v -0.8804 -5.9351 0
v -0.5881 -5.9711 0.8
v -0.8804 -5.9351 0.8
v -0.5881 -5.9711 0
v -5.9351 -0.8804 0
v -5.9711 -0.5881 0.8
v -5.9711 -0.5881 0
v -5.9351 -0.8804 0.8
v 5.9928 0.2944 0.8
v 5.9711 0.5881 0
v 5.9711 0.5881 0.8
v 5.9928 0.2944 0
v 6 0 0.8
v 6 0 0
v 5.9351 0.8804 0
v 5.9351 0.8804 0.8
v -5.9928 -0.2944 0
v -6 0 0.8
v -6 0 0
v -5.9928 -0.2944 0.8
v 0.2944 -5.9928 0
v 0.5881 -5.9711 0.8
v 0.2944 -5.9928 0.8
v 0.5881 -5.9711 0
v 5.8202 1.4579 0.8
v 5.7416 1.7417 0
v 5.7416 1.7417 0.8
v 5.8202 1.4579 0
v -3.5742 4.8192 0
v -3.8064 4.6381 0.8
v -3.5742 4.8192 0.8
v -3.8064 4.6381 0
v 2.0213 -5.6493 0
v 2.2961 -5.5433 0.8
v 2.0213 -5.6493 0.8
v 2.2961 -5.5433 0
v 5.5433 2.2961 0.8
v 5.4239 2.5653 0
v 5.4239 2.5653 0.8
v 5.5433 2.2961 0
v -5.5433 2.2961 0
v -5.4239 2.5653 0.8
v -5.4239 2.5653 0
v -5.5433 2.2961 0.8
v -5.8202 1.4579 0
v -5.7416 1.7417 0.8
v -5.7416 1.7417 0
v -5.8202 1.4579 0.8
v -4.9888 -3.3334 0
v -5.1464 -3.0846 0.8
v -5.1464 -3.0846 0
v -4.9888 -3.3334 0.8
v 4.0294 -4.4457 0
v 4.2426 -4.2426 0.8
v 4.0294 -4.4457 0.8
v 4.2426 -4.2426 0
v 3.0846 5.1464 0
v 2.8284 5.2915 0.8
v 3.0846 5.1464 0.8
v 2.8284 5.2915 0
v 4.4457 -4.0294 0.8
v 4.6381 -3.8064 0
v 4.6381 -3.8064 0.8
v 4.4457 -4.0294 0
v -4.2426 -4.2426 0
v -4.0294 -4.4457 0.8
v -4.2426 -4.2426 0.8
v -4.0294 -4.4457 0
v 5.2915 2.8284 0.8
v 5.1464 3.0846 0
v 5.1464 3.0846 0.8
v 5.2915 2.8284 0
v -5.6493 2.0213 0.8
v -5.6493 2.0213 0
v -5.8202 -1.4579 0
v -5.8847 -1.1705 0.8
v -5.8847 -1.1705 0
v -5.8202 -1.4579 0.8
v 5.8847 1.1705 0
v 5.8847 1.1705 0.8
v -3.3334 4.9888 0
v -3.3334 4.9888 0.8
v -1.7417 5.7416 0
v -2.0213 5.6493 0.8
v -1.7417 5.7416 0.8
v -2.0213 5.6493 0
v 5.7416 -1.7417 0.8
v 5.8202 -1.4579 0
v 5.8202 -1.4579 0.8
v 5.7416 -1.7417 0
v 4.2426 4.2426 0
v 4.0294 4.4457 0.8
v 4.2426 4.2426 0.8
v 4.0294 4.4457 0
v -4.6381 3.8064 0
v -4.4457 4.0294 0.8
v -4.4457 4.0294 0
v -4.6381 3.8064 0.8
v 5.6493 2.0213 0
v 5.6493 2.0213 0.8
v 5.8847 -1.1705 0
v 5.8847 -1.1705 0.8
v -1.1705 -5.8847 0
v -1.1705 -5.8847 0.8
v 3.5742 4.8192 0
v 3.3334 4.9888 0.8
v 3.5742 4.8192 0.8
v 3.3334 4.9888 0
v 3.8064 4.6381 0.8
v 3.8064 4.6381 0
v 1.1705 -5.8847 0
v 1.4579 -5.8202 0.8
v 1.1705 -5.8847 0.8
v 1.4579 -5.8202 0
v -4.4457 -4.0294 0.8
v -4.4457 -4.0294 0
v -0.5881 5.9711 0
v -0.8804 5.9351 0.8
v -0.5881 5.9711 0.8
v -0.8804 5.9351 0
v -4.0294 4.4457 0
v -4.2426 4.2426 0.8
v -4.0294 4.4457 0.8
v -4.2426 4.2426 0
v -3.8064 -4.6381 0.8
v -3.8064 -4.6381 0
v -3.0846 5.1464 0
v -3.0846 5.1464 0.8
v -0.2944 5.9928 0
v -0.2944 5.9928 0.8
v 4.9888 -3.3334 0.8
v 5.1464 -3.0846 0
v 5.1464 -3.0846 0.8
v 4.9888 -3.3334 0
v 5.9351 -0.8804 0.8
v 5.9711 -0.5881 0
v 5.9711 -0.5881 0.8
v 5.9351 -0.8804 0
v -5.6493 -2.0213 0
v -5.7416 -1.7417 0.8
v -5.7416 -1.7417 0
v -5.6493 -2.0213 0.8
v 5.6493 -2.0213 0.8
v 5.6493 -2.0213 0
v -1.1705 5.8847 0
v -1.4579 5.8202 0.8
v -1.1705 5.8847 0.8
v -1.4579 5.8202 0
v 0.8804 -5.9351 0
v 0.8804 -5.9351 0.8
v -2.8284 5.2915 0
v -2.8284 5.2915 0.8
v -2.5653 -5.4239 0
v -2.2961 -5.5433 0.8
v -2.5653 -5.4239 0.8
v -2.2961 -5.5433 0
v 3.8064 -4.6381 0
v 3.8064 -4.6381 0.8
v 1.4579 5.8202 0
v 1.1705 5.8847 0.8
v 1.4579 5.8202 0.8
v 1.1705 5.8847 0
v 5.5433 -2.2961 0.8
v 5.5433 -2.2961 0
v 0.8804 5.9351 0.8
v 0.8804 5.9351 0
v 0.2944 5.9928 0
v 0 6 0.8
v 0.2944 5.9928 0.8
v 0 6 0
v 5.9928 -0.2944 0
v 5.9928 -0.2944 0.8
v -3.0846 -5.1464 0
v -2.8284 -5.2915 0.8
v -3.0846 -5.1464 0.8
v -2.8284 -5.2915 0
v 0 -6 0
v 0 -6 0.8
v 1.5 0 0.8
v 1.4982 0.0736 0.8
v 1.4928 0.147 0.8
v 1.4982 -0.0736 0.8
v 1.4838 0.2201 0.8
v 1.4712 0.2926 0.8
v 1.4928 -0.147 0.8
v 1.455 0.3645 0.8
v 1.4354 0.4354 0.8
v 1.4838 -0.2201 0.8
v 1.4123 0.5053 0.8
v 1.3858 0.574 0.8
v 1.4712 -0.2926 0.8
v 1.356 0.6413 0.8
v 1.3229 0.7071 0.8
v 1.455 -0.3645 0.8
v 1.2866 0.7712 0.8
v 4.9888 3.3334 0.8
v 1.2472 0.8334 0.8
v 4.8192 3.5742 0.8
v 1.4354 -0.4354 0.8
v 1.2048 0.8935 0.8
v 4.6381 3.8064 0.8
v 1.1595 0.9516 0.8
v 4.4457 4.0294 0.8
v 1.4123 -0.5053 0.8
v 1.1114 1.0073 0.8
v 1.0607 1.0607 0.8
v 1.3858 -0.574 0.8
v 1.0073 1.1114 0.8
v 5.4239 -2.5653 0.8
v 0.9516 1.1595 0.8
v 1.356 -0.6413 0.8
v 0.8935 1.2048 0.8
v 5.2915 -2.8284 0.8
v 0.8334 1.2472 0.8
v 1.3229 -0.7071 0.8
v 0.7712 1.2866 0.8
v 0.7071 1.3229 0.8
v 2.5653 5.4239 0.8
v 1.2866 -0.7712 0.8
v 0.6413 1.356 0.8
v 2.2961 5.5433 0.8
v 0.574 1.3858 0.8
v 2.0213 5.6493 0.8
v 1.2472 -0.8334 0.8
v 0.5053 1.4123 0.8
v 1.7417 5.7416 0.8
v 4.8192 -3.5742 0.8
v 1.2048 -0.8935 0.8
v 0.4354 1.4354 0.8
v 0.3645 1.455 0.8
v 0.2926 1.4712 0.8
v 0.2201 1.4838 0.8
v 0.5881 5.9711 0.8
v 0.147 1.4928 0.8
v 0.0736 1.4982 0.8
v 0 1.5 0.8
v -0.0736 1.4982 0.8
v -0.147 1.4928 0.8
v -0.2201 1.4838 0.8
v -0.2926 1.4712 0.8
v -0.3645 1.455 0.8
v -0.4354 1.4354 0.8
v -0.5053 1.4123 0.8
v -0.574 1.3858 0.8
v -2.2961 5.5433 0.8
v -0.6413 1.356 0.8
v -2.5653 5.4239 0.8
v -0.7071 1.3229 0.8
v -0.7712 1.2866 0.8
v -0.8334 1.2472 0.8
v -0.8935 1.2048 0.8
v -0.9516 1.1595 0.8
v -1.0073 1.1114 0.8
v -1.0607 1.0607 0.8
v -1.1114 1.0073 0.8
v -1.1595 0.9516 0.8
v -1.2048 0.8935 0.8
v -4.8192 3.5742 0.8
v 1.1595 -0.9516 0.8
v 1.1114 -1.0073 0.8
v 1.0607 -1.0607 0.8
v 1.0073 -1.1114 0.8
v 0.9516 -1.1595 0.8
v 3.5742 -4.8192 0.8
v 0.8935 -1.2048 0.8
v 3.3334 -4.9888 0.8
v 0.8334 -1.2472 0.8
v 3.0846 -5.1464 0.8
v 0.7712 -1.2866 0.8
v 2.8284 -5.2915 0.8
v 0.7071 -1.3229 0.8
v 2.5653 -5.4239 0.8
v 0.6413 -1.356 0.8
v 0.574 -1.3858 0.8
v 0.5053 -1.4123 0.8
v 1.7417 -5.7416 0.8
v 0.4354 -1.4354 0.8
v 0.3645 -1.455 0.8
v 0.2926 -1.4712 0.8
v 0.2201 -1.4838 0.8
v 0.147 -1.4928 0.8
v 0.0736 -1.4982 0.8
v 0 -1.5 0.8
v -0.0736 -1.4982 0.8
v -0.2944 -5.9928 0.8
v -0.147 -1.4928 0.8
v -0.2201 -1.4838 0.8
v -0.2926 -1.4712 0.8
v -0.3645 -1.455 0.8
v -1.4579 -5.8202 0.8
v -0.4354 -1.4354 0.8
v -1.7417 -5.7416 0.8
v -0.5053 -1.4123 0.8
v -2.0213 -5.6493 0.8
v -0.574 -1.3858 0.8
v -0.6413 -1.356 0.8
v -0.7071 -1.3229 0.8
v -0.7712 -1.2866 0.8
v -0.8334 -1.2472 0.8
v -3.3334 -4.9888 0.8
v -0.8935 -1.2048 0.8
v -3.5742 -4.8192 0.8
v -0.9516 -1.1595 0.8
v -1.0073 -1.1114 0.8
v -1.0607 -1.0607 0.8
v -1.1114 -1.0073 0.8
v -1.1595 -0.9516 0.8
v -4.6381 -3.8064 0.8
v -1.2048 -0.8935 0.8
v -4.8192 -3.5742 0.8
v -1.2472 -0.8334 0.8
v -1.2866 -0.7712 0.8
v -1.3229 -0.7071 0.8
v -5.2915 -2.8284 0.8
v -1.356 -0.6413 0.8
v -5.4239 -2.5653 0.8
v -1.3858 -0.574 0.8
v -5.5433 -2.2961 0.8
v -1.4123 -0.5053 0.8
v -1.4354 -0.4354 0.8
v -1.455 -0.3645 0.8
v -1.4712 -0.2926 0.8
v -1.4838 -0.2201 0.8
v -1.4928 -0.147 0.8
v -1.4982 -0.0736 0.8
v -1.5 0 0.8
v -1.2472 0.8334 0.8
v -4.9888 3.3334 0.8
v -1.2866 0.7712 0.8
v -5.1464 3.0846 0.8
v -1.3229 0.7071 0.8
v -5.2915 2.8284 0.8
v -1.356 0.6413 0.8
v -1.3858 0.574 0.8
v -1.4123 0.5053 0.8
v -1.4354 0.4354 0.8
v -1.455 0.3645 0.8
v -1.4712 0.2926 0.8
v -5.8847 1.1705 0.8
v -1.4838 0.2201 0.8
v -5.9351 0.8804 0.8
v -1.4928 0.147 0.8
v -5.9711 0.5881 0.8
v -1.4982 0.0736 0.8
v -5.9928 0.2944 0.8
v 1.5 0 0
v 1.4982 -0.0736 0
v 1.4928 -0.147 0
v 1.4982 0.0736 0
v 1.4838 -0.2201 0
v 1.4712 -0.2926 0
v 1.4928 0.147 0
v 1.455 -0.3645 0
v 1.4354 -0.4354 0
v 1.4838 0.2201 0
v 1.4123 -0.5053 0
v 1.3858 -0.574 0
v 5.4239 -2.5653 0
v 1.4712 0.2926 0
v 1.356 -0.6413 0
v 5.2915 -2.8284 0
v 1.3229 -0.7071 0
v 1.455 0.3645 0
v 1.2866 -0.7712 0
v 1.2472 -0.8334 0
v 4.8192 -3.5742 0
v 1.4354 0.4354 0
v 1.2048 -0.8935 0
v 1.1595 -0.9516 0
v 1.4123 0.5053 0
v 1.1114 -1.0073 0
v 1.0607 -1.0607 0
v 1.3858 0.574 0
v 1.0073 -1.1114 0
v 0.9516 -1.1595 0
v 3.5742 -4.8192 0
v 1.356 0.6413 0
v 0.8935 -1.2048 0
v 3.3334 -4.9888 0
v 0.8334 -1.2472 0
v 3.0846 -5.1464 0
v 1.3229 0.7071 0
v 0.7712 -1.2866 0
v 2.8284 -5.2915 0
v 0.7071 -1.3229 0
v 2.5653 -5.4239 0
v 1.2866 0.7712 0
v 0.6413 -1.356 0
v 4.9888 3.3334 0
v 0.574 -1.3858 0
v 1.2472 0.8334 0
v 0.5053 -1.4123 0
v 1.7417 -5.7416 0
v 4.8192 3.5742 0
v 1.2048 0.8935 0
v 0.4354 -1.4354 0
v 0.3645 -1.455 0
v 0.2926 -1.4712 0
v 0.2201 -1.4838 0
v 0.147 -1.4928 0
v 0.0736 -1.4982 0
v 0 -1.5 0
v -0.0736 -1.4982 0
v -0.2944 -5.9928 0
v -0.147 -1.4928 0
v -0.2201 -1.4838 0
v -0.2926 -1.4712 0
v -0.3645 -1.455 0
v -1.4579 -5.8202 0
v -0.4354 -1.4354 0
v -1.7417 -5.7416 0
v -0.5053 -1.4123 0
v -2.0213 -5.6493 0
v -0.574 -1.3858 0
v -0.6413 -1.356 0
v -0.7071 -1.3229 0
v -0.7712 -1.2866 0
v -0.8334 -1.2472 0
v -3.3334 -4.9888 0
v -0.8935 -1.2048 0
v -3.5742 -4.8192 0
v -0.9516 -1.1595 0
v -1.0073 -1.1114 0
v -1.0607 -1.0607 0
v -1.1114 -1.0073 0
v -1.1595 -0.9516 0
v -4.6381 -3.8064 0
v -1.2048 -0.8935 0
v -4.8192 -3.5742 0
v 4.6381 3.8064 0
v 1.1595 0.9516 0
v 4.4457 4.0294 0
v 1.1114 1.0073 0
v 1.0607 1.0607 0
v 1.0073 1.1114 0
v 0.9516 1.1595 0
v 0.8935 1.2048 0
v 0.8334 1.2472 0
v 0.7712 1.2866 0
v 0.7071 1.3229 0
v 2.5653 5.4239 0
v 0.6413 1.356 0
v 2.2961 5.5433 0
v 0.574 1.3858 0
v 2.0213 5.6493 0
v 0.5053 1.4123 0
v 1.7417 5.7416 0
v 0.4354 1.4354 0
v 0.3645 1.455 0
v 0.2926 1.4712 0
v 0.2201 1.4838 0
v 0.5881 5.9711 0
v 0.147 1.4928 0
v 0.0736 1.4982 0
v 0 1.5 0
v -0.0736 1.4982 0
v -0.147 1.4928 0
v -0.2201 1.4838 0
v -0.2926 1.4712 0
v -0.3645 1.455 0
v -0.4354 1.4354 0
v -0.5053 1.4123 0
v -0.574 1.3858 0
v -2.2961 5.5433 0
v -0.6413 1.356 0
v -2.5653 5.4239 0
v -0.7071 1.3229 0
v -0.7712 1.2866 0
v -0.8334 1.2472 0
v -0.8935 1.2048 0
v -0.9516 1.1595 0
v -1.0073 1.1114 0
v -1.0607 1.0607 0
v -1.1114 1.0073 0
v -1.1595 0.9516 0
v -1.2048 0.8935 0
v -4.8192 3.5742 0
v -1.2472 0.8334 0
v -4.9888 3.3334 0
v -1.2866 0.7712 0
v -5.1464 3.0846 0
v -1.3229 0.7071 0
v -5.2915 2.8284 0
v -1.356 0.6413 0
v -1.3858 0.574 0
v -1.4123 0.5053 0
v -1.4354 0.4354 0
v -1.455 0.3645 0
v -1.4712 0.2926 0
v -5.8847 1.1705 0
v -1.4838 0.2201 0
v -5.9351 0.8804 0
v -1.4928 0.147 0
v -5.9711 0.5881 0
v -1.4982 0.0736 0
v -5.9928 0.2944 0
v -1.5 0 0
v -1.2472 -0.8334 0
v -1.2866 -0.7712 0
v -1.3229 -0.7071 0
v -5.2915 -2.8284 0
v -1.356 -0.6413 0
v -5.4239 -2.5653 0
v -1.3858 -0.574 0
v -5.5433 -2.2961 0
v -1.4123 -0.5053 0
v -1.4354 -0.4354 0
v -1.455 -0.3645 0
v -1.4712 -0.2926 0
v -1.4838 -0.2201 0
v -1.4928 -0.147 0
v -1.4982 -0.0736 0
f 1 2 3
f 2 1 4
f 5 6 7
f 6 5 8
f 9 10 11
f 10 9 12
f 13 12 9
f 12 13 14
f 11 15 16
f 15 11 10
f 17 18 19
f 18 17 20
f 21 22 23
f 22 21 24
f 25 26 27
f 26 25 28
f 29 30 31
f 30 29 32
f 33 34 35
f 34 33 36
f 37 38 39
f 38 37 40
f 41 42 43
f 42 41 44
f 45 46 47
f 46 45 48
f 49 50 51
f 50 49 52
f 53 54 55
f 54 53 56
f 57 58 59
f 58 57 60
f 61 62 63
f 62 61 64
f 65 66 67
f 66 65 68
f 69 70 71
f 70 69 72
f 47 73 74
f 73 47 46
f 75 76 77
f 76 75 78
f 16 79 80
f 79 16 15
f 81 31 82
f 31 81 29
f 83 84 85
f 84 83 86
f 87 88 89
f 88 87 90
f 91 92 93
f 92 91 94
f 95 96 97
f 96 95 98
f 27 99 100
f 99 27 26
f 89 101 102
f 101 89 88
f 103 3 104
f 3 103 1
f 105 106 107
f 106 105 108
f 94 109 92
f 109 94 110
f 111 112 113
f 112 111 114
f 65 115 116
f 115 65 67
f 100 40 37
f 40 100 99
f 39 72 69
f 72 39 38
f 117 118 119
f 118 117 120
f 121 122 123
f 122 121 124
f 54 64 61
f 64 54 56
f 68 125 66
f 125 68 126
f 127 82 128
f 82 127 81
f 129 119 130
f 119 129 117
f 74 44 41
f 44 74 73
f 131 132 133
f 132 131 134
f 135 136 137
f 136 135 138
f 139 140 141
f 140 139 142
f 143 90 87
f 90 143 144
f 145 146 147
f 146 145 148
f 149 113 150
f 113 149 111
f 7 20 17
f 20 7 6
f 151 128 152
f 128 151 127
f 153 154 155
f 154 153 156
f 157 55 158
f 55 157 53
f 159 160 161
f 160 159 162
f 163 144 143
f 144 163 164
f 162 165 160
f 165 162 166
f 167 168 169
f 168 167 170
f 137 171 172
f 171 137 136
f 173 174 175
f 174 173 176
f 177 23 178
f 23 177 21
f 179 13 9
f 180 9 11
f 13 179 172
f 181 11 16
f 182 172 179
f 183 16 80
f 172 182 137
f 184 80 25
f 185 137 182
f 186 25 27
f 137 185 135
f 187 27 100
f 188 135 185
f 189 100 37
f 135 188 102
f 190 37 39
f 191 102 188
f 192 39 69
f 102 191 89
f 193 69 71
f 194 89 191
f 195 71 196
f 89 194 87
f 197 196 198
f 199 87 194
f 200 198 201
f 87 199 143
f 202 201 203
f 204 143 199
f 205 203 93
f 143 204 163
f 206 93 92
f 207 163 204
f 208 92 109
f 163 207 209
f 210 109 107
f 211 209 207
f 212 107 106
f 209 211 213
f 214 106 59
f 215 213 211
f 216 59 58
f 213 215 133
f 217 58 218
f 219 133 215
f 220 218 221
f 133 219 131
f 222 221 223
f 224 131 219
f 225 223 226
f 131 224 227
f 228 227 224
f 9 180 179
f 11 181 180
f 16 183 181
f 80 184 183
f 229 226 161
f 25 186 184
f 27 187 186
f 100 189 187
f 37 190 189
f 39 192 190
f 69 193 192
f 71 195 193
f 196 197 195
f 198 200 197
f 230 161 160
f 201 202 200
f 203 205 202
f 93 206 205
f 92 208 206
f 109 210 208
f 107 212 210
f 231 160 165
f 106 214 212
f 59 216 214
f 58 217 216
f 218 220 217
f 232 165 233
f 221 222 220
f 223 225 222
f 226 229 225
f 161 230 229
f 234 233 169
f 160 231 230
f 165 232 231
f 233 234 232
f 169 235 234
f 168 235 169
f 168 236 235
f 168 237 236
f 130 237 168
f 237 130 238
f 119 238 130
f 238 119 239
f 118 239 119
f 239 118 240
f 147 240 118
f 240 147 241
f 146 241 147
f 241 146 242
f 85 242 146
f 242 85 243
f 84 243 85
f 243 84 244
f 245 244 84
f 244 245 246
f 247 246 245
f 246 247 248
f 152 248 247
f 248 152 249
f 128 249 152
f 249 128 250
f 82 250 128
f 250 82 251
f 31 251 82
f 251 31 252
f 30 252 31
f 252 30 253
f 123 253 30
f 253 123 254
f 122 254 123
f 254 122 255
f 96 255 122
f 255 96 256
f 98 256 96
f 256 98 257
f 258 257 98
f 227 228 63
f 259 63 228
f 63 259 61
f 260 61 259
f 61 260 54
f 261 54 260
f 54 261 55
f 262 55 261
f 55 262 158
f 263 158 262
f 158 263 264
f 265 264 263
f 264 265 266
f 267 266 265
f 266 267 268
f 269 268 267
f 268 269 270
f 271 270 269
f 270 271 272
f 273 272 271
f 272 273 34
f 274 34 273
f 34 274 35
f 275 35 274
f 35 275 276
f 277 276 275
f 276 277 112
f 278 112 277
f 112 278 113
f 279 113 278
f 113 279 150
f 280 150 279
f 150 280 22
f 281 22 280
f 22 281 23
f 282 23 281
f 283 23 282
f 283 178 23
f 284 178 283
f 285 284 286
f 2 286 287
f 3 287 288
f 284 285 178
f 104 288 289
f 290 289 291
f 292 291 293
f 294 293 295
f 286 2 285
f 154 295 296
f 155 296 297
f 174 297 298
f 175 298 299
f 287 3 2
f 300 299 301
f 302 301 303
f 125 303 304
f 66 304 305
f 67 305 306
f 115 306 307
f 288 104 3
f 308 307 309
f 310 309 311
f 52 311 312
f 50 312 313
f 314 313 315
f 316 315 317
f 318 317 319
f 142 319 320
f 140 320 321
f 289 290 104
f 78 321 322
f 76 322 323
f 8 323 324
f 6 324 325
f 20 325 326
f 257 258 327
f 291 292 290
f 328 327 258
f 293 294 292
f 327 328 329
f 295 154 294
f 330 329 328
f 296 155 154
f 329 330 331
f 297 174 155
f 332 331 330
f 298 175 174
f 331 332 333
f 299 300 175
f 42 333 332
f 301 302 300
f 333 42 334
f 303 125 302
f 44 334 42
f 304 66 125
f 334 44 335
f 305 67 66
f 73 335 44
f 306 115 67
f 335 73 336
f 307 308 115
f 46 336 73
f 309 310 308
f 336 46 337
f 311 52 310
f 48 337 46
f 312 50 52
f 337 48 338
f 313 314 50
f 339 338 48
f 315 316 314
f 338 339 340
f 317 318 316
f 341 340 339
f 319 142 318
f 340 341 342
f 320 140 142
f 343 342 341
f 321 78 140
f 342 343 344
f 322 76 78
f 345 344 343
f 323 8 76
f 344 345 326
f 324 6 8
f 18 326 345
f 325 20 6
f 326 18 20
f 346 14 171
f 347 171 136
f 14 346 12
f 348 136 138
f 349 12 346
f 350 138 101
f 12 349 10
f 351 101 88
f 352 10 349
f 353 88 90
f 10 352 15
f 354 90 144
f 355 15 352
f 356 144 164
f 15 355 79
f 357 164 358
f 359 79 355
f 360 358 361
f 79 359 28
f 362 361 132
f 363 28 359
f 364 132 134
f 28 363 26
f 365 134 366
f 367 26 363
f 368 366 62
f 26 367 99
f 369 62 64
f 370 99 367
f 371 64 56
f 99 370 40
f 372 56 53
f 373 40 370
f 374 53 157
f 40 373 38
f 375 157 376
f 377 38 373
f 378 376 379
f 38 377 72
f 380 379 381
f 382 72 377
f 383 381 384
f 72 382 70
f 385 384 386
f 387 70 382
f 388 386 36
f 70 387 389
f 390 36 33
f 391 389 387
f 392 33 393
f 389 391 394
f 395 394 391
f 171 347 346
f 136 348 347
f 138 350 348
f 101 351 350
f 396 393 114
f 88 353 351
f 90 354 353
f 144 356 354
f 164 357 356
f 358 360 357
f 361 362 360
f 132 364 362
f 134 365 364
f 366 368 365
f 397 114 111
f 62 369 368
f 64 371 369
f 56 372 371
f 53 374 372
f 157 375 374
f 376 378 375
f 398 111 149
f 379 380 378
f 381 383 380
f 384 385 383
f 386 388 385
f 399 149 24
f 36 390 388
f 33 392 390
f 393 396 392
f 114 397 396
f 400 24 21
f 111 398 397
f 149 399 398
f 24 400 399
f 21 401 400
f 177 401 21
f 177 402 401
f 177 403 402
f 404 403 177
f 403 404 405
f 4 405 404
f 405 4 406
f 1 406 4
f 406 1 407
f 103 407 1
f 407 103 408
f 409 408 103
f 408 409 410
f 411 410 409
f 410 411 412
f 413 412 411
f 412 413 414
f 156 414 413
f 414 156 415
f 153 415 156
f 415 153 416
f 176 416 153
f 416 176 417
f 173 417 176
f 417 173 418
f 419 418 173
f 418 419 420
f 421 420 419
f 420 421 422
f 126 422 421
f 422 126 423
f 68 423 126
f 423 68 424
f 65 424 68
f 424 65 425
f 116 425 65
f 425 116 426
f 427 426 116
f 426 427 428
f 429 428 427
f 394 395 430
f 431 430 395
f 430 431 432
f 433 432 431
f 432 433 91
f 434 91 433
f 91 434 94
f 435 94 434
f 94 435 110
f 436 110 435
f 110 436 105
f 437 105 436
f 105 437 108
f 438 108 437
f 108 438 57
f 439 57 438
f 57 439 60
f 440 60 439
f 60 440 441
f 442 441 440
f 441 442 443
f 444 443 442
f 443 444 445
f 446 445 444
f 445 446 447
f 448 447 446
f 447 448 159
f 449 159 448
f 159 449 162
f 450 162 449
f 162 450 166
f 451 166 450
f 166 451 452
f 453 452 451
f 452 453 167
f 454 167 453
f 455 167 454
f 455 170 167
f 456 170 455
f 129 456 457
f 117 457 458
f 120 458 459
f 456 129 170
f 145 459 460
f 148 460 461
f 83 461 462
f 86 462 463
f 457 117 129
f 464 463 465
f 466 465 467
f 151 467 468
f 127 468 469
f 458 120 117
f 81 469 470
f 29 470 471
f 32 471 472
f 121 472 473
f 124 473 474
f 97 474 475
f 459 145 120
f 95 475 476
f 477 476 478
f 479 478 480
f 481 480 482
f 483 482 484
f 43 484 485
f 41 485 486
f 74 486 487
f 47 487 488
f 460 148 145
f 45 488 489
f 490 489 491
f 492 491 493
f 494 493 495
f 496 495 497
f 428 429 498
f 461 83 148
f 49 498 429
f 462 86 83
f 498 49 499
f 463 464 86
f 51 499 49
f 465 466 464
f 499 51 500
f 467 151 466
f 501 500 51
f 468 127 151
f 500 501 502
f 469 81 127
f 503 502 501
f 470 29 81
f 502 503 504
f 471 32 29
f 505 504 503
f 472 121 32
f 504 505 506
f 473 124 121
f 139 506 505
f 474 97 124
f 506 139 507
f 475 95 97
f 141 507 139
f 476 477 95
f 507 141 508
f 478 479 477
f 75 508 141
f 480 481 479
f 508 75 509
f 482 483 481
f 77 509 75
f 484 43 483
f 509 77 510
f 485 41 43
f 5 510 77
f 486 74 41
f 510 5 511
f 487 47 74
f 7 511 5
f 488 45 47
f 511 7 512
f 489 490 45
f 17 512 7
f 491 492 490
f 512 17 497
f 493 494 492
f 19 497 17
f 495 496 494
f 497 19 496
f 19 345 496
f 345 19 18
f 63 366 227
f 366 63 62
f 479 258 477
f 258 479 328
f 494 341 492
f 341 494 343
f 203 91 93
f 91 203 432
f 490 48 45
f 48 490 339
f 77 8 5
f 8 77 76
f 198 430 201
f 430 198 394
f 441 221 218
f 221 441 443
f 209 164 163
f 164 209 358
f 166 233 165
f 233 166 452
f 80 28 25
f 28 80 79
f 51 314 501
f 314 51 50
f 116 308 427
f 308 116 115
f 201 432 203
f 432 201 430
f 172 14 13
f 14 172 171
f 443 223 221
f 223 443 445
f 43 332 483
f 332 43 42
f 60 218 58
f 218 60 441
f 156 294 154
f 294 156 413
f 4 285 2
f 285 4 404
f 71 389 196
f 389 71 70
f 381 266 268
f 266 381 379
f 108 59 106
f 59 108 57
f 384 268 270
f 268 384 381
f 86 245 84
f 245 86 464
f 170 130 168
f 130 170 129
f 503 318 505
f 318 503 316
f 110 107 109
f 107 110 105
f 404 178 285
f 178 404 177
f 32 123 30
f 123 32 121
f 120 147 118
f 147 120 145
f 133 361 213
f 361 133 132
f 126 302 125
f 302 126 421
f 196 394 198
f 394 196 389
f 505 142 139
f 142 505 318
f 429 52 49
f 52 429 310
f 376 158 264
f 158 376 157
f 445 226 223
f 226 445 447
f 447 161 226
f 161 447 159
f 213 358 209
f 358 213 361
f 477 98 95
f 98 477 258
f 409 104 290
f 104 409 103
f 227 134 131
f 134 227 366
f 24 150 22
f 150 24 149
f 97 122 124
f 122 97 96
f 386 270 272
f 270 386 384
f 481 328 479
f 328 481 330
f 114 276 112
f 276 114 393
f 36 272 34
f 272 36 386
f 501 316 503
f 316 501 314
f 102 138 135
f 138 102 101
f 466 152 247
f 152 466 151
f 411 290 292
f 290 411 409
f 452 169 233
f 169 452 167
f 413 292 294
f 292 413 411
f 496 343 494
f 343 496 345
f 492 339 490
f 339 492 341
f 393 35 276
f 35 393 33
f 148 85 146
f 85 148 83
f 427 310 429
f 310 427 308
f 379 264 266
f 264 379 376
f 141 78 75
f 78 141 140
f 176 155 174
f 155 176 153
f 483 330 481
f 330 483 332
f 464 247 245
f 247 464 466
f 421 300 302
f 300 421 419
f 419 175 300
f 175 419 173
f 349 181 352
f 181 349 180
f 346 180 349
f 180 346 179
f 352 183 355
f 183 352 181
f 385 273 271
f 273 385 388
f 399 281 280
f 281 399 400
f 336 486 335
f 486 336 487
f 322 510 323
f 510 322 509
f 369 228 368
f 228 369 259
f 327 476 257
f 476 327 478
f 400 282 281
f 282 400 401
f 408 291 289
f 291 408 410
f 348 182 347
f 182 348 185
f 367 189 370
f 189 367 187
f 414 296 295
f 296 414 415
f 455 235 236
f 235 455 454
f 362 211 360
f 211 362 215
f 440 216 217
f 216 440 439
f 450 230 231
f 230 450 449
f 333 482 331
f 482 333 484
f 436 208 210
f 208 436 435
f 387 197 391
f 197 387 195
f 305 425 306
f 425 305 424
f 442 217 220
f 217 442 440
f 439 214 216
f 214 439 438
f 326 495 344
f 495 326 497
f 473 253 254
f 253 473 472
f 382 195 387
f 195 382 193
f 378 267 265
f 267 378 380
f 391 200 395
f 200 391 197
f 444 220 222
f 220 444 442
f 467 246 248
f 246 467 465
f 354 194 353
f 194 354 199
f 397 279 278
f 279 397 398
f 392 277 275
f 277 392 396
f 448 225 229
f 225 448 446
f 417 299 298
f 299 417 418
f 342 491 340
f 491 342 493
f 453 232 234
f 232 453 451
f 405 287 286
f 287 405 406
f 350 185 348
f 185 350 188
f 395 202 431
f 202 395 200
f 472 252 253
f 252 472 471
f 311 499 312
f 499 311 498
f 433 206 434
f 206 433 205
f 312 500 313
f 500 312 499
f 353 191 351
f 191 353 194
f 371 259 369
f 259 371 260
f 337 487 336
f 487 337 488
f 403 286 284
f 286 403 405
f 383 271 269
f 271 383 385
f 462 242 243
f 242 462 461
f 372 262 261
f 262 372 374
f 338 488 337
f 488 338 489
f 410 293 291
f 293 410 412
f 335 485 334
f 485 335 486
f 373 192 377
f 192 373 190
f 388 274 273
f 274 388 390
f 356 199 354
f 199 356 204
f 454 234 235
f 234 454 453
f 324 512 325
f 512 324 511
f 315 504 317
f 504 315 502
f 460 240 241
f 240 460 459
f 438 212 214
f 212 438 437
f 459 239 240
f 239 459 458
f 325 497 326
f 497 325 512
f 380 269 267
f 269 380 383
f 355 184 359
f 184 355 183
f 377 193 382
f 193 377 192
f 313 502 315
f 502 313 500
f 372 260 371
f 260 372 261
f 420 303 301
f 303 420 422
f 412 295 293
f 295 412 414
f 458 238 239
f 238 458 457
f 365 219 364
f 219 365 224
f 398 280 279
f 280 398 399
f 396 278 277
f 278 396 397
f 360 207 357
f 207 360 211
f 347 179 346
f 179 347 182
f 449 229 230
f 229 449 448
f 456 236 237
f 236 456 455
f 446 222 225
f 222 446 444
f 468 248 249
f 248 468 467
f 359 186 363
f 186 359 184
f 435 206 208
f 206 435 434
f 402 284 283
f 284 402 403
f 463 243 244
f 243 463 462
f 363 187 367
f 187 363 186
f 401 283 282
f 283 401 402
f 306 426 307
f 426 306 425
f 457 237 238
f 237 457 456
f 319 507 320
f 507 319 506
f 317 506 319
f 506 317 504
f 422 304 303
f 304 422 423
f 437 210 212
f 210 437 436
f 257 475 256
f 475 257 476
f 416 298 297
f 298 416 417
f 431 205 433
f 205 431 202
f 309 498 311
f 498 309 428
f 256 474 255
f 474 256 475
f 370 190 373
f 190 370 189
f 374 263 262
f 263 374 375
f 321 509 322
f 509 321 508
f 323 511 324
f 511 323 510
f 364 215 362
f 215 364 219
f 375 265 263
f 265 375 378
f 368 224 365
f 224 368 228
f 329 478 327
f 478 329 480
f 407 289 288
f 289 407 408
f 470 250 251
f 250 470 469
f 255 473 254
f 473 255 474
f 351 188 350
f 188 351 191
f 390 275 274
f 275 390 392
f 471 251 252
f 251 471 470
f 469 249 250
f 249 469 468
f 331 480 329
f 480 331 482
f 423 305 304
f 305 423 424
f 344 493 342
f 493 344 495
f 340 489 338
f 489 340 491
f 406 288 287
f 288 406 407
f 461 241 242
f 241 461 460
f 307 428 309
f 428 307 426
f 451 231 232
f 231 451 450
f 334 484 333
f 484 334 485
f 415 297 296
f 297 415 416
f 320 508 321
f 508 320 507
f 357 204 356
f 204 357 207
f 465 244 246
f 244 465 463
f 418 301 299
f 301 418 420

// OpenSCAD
$fn = 128;

inner_d = 3.0;
outer_d = 12.0;
thickness = 0.8;

difference() {
  cylinder(d = outer_d, h = thickness);
  translate([0, 0, -0.1])
    cylinder(d = inner_d, h = thickness + 0.2);
}
